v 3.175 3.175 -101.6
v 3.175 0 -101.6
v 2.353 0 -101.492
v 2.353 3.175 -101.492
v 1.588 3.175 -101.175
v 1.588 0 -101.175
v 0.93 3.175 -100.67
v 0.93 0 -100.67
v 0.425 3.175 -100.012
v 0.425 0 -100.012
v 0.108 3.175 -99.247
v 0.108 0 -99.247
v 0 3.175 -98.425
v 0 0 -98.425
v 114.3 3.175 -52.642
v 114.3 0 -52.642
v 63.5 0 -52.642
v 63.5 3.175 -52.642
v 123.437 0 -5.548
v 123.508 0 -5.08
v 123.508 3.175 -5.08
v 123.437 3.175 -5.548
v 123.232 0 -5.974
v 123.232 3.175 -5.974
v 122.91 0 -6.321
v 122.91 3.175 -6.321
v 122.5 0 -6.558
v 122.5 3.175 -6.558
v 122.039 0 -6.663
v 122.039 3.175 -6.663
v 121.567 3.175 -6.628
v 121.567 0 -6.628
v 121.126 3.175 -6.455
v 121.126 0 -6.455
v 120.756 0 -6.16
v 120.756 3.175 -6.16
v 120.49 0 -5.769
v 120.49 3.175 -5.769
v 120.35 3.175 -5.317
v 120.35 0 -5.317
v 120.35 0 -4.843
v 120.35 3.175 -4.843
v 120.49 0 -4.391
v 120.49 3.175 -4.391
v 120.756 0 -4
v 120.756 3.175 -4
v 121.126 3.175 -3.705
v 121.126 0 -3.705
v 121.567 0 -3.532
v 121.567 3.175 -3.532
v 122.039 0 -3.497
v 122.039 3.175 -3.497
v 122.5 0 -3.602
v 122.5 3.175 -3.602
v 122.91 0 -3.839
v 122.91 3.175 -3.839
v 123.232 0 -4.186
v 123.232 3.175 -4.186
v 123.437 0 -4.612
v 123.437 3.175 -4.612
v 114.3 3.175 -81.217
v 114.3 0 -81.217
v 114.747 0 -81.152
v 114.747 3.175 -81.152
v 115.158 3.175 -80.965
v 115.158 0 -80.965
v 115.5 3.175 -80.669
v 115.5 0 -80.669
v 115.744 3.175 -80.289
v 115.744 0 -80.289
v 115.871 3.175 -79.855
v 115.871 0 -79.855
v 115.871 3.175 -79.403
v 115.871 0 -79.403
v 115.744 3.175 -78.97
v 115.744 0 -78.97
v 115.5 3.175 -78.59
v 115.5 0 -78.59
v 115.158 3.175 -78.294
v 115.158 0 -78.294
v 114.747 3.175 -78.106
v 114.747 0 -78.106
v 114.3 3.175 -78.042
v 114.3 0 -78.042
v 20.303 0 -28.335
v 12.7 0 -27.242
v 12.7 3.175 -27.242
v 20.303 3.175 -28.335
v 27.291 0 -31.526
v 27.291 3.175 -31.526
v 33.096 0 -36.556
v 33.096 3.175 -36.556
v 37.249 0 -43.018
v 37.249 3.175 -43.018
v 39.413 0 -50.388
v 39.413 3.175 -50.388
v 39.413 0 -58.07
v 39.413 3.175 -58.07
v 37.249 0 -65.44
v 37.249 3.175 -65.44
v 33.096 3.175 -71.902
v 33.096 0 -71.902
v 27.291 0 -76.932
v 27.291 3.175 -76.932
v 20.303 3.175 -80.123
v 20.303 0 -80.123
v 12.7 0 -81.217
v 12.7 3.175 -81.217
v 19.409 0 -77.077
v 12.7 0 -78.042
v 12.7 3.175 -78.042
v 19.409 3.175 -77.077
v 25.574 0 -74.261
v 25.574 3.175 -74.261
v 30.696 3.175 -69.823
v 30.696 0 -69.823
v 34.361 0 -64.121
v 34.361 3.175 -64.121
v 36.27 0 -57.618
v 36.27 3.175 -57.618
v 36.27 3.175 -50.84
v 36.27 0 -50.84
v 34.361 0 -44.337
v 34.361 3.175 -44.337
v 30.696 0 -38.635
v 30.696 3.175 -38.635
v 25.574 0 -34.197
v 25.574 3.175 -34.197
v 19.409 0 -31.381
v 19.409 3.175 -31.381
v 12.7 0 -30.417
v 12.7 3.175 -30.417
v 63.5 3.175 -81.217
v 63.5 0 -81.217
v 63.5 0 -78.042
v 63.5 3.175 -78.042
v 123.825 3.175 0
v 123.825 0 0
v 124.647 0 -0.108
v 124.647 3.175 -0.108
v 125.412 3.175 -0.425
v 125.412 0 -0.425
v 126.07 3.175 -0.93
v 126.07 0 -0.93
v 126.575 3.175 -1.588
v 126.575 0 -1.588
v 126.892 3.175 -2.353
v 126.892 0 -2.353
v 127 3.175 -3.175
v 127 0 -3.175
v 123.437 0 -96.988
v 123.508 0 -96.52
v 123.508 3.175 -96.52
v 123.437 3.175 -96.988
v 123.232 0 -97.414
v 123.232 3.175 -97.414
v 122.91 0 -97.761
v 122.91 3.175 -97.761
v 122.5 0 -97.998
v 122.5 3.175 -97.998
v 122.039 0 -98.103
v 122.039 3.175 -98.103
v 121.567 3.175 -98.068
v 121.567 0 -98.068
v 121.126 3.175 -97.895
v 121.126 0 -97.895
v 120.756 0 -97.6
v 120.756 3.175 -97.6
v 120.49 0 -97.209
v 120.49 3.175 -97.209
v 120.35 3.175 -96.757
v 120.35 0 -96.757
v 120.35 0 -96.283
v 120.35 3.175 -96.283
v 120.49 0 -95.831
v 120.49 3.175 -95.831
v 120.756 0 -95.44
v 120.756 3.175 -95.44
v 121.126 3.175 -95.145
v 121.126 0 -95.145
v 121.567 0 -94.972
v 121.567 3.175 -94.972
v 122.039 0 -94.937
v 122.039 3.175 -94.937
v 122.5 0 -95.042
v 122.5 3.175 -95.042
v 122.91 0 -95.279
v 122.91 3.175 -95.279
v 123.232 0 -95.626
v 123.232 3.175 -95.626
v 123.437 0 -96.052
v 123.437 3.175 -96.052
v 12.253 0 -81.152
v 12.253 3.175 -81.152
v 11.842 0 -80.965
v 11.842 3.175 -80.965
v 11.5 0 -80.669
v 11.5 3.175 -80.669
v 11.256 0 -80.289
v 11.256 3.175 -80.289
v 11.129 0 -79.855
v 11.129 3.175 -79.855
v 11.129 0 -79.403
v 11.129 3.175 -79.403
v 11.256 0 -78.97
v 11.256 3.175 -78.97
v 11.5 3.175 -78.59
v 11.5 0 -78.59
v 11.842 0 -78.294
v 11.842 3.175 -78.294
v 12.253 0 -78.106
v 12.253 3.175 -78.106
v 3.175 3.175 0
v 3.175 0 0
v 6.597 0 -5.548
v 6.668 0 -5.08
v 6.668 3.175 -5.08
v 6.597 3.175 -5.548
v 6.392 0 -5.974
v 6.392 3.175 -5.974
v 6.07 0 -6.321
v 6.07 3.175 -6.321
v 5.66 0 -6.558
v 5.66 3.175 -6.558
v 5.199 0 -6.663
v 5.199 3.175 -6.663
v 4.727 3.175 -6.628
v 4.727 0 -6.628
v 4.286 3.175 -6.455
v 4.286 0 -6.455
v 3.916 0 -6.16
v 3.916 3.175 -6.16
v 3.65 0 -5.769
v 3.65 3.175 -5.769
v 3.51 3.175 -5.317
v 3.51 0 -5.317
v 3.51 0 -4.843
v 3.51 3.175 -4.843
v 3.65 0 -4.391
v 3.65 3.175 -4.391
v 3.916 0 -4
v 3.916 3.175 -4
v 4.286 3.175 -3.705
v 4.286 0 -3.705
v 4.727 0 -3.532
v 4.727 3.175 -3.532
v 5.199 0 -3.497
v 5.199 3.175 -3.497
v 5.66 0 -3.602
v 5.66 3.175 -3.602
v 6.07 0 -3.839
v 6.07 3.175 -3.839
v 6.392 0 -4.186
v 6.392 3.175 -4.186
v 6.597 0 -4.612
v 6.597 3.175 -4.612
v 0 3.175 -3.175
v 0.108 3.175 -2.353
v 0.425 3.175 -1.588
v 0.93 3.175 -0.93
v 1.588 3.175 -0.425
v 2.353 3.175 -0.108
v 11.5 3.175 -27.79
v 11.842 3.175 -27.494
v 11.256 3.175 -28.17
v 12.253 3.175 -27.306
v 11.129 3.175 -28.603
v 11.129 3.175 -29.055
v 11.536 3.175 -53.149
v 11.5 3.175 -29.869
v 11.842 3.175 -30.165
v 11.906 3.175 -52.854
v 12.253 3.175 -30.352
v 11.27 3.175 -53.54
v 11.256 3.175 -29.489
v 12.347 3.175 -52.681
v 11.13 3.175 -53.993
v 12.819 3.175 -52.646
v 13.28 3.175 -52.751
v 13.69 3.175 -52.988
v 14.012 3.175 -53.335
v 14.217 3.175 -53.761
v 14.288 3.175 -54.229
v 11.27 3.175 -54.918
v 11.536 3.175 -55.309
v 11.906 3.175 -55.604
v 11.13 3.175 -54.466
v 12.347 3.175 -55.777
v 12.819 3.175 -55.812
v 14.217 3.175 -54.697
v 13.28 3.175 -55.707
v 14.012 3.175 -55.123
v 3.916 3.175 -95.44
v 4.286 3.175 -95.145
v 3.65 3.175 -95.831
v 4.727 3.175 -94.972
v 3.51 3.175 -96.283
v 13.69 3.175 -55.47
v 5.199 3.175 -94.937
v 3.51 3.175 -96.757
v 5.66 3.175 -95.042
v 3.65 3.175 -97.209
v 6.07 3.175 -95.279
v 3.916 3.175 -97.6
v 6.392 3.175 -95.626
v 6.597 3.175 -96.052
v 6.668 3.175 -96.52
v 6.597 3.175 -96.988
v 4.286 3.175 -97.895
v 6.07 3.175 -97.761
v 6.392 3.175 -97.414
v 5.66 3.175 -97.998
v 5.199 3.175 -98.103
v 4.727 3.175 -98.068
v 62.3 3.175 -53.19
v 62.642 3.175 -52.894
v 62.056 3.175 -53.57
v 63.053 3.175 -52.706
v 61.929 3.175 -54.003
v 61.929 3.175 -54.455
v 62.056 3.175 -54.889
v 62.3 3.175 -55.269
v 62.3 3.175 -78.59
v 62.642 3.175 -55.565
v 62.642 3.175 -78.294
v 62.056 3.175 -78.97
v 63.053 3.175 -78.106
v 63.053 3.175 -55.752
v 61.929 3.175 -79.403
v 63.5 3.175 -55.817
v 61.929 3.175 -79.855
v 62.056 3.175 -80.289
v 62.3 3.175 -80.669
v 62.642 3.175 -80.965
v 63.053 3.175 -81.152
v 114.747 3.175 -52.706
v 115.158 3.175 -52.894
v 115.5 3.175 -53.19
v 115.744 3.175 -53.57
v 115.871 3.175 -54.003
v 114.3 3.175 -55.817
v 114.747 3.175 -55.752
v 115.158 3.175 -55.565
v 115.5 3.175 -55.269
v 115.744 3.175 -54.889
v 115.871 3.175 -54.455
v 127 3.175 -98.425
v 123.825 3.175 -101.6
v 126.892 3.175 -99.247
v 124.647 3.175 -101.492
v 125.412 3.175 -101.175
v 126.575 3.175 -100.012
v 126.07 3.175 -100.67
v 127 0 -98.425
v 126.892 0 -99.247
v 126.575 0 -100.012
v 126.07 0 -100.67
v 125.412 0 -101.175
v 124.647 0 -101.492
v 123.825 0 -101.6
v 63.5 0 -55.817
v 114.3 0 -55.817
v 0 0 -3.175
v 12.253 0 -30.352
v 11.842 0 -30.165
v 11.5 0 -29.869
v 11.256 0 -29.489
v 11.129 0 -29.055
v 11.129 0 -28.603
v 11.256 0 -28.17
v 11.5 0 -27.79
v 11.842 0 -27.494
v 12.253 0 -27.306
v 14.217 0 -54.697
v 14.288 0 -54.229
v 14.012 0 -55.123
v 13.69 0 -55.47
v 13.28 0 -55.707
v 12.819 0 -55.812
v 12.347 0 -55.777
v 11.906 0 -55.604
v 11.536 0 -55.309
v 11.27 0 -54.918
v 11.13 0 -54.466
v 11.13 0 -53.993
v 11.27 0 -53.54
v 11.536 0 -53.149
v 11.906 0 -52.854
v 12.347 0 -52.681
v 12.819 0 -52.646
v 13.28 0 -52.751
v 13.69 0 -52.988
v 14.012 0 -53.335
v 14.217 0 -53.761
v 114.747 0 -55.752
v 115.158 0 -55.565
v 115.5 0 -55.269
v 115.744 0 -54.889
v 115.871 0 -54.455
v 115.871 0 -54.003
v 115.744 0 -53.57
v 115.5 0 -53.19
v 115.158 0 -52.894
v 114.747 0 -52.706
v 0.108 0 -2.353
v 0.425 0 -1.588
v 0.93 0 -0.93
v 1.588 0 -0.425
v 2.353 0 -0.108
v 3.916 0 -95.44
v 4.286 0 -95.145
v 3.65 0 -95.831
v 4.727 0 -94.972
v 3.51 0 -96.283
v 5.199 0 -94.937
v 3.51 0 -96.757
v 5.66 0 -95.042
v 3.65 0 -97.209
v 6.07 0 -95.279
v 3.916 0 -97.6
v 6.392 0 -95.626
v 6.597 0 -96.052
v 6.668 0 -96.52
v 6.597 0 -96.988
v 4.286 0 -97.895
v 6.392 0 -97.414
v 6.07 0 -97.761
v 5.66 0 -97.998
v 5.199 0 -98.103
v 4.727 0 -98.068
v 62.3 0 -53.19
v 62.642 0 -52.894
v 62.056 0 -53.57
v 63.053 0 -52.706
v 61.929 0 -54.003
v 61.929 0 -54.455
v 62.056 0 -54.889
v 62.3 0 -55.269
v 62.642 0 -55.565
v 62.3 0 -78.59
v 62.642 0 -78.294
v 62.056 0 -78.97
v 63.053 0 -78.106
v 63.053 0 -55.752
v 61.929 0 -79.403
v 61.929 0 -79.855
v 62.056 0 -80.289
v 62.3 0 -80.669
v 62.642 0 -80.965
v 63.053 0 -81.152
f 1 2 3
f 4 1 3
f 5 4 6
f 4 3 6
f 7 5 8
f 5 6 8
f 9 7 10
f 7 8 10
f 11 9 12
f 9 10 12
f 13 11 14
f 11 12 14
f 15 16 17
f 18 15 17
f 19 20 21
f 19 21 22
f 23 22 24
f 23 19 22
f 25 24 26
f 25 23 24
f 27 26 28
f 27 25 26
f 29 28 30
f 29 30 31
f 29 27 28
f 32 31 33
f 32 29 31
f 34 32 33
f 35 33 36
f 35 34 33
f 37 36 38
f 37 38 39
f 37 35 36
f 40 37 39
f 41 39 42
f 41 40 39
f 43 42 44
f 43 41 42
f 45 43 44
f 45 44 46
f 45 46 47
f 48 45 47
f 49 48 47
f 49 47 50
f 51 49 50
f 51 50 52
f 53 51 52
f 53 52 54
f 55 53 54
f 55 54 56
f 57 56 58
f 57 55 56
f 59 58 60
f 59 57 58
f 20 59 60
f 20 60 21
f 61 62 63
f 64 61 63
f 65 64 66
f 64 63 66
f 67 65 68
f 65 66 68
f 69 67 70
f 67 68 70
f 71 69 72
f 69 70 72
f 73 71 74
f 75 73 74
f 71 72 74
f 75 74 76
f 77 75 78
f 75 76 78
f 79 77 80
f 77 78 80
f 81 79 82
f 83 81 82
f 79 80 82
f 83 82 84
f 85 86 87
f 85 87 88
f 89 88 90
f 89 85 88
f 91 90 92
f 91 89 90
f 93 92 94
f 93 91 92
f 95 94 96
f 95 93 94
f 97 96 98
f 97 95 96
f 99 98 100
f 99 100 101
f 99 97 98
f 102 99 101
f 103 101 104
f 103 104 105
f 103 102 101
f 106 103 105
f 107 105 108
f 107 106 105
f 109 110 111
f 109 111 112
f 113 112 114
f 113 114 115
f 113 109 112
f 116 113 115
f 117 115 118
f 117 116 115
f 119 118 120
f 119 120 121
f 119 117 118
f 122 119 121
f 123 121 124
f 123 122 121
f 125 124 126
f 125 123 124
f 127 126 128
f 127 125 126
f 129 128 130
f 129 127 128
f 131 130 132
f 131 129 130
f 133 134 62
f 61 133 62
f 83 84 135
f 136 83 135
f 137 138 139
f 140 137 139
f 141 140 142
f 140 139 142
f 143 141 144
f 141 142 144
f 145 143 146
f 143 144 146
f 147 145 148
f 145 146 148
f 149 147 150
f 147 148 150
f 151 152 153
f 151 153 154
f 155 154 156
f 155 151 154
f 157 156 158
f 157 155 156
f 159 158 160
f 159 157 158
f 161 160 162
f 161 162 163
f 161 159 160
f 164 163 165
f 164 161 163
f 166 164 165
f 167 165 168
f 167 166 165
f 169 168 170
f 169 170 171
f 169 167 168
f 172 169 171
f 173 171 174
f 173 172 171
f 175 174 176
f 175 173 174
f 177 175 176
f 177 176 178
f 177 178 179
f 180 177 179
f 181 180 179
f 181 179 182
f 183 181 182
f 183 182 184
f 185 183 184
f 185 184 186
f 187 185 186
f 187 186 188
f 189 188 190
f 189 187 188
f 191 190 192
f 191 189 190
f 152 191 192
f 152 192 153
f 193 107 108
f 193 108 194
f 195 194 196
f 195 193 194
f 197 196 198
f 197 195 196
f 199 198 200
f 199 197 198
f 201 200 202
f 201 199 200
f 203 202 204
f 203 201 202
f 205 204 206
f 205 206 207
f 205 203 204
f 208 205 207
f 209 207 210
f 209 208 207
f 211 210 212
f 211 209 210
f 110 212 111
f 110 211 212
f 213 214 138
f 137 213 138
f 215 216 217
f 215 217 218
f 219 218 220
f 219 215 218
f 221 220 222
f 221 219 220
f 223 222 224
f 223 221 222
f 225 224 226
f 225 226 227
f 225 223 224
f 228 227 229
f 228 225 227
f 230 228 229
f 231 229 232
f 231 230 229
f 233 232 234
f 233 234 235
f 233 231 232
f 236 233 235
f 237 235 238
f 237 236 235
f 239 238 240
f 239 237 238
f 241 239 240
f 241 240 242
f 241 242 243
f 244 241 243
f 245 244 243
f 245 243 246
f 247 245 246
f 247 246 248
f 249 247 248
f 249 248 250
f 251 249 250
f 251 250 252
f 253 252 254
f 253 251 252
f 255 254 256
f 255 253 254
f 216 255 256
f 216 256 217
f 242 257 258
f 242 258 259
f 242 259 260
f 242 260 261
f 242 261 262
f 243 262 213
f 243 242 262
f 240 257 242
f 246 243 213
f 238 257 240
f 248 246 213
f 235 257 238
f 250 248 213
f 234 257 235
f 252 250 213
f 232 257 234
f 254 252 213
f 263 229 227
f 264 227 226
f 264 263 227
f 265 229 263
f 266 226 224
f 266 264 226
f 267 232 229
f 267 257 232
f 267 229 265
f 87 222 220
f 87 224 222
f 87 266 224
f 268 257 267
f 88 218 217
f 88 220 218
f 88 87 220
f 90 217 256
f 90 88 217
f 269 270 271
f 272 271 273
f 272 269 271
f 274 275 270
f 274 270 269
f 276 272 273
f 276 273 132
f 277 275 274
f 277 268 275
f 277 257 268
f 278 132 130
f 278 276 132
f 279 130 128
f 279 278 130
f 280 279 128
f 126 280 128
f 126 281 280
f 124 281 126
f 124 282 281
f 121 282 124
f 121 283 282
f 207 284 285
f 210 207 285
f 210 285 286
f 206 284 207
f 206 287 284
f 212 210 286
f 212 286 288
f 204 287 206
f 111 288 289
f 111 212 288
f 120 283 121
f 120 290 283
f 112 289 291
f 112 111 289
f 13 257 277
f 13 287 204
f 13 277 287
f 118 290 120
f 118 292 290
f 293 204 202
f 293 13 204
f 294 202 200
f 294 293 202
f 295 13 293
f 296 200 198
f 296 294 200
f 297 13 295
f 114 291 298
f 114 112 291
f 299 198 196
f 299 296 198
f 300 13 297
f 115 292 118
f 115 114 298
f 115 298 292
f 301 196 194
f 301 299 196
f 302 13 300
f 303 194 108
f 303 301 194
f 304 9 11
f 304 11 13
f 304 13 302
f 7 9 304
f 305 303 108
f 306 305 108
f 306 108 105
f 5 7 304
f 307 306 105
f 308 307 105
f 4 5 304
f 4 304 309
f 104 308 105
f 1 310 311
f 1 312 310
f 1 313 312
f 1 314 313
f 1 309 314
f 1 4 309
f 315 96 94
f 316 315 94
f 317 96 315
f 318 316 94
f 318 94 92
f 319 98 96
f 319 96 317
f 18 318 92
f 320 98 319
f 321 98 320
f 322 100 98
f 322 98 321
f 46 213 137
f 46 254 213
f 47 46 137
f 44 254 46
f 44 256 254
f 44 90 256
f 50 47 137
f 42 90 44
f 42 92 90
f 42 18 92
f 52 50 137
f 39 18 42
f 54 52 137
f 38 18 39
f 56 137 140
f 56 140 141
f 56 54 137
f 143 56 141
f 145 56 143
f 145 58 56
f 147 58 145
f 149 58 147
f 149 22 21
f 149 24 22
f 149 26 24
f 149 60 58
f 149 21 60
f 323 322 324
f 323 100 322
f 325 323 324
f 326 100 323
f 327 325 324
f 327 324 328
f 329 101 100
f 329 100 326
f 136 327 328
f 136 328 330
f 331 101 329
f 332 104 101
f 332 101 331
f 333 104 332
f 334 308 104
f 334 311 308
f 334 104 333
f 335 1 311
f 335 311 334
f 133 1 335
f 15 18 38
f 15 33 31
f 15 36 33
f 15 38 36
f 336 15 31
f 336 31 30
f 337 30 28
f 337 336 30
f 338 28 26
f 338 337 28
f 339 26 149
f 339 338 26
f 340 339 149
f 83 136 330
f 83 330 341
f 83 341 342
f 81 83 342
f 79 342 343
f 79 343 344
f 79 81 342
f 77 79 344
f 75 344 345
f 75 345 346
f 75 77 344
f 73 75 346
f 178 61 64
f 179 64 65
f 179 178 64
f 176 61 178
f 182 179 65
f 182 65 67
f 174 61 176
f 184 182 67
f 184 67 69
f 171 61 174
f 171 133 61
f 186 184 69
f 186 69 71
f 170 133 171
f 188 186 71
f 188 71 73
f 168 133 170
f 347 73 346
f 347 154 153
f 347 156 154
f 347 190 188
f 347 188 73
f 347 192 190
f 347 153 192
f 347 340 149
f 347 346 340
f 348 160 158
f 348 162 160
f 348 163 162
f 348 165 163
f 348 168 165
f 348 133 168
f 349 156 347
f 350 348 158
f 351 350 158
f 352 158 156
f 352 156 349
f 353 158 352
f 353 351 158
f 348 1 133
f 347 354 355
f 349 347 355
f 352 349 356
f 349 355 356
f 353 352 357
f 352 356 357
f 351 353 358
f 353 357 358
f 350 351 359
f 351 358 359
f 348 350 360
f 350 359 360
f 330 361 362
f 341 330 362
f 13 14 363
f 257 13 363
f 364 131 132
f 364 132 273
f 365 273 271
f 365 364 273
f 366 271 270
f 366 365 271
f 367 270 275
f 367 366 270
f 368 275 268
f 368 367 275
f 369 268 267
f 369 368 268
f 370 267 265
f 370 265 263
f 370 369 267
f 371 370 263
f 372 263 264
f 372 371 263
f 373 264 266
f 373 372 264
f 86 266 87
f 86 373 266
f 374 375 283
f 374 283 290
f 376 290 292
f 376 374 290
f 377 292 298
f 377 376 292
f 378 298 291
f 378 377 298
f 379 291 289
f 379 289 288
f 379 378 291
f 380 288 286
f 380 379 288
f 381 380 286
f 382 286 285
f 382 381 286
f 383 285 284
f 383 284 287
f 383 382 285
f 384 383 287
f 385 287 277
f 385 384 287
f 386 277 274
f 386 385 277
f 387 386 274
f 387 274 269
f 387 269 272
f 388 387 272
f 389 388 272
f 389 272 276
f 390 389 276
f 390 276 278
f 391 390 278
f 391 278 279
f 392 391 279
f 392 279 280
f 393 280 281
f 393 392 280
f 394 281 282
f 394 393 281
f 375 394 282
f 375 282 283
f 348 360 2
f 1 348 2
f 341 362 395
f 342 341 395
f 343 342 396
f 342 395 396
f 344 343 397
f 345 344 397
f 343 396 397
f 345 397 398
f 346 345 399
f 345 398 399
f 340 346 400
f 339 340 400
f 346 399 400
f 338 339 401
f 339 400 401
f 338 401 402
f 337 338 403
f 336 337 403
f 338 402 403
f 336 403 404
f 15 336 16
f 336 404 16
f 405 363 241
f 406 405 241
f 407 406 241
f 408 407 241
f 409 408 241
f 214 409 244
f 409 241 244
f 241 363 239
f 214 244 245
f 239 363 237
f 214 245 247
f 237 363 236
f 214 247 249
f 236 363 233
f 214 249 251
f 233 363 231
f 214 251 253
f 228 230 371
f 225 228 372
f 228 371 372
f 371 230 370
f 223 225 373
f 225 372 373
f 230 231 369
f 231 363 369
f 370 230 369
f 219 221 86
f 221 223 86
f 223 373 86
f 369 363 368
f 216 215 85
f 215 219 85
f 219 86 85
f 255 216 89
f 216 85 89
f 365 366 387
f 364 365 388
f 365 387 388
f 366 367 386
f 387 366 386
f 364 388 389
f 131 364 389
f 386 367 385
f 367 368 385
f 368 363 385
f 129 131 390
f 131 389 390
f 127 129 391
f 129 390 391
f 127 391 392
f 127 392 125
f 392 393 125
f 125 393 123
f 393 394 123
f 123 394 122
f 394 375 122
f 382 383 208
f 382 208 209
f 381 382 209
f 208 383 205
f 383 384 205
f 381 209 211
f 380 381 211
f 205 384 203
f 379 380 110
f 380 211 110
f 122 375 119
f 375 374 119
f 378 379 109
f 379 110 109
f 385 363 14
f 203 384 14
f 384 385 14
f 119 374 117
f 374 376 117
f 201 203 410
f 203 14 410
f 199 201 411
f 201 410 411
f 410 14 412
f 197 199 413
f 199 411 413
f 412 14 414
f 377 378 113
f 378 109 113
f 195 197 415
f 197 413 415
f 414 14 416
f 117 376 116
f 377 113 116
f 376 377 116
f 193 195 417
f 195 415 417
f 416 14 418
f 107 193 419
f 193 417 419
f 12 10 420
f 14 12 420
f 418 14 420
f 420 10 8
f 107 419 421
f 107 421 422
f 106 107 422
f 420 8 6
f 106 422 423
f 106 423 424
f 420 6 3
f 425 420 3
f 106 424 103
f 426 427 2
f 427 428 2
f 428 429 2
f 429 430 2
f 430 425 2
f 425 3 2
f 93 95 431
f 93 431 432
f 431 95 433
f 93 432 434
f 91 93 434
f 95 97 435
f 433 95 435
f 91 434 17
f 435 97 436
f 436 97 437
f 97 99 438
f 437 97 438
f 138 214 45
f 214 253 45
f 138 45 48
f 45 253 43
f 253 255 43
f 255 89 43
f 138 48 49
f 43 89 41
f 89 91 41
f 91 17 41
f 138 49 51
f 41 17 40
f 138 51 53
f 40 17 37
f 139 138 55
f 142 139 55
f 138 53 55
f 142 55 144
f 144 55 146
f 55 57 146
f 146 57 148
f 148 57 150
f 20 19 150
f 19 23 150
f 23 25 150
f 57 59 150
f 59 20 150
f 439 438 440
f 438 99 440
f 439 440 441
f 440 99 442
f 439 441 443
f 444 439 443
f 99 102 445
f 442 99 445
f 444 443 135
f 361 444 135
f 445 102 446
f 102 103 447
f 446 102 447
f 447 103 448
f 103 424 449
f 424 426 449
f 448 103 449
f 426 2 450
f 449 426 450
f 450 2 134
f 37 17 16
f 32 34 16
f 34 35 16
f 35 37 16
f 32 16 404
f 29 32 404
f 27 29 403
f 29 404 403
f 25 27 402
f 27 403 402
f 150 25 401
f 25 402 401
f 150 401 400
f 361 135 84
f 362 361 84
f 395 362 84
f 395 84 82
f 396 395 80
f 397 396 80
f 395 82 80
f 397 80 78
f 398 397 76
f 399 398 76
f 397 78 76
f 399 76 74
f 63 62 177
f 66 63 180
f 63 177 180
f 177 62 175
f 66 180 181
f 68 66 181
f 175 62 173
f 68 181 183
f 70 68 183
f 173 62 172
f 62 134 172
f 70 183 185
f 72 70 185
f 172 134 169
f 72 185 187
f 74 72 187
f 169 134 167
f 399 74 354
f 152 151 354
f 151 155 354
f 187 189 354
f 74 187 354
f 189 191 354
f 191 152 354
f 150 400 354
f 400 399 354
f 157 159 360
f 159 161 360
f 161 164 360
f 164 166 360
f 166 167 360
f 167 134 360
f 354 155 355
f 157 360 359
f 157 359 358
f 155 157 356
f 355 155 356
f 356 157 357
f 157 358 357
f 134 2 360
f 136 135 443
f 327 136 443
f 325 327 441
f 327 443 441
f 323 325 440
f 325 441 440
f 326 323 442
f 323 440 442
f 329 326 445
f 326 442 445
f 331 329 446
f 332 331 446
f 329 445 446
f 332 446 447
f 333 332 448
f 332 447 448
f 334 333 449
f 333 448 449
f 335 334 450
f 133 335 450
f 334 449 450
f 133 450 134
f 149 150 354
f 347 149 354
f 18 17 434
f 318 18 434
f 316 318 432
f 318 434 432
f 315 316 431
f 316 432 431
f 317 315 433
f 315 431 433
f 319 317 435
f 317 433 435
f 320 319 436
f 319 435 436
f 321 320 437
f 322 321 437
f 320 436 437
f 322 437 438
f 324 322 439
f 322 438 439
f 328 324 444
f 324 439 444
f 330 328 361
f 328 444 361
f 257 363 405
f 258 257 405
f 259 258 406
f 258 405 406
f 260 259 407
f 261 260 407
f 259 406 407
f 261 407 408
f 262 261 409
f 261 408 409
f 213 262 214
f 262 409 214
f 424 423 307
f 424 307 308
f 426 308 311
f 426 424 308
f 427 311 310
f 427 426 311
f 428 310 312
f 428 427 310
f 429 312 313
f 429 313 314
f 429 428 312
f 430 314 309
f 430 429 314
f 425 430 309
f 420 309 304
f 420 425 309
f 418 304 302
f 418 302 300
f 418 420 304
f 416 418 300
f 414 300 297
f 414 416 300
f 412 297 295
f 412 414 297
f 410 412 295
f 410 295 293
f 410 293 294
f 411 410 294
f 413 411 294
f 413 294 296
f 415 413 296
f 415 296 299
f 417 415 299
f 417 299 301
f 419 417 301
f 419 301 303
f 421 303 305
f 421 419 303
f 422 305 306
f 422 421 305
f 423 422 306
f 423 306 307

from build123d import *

# Parameters (mm, degrees)
SKETCH1_R           = 1.5875
BOSS_EXTRUDE1_DEPTH = 3.175


with BuildPart() as part:
    # Sketch1 → Boss-Extrude1 (new body)
    with BuildSketch(Plane(origin=(0, 0, 0), x_dir=(1, 0, 0), z_dir=(0, 1, 0))):
        with BuildLine():
            Line((3.175, 0), (123.825, 0))
            ThreePointArc((123.825, 0), (126.07006403, 0.92993597), (127, 3.175))
            Line((127, 3.175), (127, 98.425))
            ThreePointArc((127, 98.425), (126.07006403, 100.67006403), (123.825, 101.6))
            Line((123.825, 101.6), (3.175, 101.6))
            ThreePointArc((3.175, 101.6), (0.92993597, 100.67006403), (0, 98.425))
            Line((0, 98.425), (0, 3.175))
            ThreePointArc((0, 3.175), (0.92993597, 0.92993597), (3.175, 0))
        make_face()
        with Locations((12.7, 54.229148011)):
            Circle(SKETCH1_R, mode=Mode.SUBTRACT)
        with Locations((5.08, 96.52)):
            Circle(SKETCH1_R, mode=Mode.SUBTRACT)
        with Locations((5.08, 5.08)):
            Circle(SKETCH1_R, mode=Mode.SUBTRACT)
        with Locations((121.92, 96.52)):
            Circle(SKETCH1_R, mode=Mode.SUBTRACT)
        with Locations((121.92, 5.08)):
            Circle(SKETCH1_R, mode=Mode.SUBTRACT)
        with BuildLine():
            Line((63.5, 81.216648011), (114.3, 81.216648011))
            ThreePointArc((114.3, 81.216648011), (115.8875, 79.629148011), (114.3, 78.041648011))
            Line((114.3, 78.041648011), (63.5, 78.041648011))
            ThreePointArc((63.5, 78.041648011), (61.9125, 79.629148011), (63.5, 81.216648011))
        make_face(mode=Mode.SUBTRACT)
        with BuildLine():
            Line((63.5, 55.816648011), (114.3, 55.816648011))
            ThreePointArc((114.3, 55.816648011), (115.8875, 54.229148011), (114.3, 52.641648011))
            Line((114.3, 52.641648011), (63.5, 52.641648011))
            ThreePointArc((63.5, 52.641648011), (61.9125, 54.229148011), (63.5, 55.816648011))
        make_face(mode=Mode.SUBTRACT)
        with BuildLine():
            ThreePointArc((12.7, 78.041648011), (36.5125, 54.229148011), (12.7, 30.416648011))
            ThreePointArc((12.7, 30.416648011), (11.1125, 28.829148011), (12.7, 27.241648011))
            ThreePointArc((12.7, 27.241648011), (39.6875, 54.229148011), (12.7, 81.216648011))
            ThreePointArc((12.7, 81.216648011), (11.1125, 79.629148011), (12.7, 78.041648011))
        make_face(mode=Mode.SUBTRACT)
    extrude(amount=BOSS_EXTRUDE1_DEPTH)


solid = part.part
